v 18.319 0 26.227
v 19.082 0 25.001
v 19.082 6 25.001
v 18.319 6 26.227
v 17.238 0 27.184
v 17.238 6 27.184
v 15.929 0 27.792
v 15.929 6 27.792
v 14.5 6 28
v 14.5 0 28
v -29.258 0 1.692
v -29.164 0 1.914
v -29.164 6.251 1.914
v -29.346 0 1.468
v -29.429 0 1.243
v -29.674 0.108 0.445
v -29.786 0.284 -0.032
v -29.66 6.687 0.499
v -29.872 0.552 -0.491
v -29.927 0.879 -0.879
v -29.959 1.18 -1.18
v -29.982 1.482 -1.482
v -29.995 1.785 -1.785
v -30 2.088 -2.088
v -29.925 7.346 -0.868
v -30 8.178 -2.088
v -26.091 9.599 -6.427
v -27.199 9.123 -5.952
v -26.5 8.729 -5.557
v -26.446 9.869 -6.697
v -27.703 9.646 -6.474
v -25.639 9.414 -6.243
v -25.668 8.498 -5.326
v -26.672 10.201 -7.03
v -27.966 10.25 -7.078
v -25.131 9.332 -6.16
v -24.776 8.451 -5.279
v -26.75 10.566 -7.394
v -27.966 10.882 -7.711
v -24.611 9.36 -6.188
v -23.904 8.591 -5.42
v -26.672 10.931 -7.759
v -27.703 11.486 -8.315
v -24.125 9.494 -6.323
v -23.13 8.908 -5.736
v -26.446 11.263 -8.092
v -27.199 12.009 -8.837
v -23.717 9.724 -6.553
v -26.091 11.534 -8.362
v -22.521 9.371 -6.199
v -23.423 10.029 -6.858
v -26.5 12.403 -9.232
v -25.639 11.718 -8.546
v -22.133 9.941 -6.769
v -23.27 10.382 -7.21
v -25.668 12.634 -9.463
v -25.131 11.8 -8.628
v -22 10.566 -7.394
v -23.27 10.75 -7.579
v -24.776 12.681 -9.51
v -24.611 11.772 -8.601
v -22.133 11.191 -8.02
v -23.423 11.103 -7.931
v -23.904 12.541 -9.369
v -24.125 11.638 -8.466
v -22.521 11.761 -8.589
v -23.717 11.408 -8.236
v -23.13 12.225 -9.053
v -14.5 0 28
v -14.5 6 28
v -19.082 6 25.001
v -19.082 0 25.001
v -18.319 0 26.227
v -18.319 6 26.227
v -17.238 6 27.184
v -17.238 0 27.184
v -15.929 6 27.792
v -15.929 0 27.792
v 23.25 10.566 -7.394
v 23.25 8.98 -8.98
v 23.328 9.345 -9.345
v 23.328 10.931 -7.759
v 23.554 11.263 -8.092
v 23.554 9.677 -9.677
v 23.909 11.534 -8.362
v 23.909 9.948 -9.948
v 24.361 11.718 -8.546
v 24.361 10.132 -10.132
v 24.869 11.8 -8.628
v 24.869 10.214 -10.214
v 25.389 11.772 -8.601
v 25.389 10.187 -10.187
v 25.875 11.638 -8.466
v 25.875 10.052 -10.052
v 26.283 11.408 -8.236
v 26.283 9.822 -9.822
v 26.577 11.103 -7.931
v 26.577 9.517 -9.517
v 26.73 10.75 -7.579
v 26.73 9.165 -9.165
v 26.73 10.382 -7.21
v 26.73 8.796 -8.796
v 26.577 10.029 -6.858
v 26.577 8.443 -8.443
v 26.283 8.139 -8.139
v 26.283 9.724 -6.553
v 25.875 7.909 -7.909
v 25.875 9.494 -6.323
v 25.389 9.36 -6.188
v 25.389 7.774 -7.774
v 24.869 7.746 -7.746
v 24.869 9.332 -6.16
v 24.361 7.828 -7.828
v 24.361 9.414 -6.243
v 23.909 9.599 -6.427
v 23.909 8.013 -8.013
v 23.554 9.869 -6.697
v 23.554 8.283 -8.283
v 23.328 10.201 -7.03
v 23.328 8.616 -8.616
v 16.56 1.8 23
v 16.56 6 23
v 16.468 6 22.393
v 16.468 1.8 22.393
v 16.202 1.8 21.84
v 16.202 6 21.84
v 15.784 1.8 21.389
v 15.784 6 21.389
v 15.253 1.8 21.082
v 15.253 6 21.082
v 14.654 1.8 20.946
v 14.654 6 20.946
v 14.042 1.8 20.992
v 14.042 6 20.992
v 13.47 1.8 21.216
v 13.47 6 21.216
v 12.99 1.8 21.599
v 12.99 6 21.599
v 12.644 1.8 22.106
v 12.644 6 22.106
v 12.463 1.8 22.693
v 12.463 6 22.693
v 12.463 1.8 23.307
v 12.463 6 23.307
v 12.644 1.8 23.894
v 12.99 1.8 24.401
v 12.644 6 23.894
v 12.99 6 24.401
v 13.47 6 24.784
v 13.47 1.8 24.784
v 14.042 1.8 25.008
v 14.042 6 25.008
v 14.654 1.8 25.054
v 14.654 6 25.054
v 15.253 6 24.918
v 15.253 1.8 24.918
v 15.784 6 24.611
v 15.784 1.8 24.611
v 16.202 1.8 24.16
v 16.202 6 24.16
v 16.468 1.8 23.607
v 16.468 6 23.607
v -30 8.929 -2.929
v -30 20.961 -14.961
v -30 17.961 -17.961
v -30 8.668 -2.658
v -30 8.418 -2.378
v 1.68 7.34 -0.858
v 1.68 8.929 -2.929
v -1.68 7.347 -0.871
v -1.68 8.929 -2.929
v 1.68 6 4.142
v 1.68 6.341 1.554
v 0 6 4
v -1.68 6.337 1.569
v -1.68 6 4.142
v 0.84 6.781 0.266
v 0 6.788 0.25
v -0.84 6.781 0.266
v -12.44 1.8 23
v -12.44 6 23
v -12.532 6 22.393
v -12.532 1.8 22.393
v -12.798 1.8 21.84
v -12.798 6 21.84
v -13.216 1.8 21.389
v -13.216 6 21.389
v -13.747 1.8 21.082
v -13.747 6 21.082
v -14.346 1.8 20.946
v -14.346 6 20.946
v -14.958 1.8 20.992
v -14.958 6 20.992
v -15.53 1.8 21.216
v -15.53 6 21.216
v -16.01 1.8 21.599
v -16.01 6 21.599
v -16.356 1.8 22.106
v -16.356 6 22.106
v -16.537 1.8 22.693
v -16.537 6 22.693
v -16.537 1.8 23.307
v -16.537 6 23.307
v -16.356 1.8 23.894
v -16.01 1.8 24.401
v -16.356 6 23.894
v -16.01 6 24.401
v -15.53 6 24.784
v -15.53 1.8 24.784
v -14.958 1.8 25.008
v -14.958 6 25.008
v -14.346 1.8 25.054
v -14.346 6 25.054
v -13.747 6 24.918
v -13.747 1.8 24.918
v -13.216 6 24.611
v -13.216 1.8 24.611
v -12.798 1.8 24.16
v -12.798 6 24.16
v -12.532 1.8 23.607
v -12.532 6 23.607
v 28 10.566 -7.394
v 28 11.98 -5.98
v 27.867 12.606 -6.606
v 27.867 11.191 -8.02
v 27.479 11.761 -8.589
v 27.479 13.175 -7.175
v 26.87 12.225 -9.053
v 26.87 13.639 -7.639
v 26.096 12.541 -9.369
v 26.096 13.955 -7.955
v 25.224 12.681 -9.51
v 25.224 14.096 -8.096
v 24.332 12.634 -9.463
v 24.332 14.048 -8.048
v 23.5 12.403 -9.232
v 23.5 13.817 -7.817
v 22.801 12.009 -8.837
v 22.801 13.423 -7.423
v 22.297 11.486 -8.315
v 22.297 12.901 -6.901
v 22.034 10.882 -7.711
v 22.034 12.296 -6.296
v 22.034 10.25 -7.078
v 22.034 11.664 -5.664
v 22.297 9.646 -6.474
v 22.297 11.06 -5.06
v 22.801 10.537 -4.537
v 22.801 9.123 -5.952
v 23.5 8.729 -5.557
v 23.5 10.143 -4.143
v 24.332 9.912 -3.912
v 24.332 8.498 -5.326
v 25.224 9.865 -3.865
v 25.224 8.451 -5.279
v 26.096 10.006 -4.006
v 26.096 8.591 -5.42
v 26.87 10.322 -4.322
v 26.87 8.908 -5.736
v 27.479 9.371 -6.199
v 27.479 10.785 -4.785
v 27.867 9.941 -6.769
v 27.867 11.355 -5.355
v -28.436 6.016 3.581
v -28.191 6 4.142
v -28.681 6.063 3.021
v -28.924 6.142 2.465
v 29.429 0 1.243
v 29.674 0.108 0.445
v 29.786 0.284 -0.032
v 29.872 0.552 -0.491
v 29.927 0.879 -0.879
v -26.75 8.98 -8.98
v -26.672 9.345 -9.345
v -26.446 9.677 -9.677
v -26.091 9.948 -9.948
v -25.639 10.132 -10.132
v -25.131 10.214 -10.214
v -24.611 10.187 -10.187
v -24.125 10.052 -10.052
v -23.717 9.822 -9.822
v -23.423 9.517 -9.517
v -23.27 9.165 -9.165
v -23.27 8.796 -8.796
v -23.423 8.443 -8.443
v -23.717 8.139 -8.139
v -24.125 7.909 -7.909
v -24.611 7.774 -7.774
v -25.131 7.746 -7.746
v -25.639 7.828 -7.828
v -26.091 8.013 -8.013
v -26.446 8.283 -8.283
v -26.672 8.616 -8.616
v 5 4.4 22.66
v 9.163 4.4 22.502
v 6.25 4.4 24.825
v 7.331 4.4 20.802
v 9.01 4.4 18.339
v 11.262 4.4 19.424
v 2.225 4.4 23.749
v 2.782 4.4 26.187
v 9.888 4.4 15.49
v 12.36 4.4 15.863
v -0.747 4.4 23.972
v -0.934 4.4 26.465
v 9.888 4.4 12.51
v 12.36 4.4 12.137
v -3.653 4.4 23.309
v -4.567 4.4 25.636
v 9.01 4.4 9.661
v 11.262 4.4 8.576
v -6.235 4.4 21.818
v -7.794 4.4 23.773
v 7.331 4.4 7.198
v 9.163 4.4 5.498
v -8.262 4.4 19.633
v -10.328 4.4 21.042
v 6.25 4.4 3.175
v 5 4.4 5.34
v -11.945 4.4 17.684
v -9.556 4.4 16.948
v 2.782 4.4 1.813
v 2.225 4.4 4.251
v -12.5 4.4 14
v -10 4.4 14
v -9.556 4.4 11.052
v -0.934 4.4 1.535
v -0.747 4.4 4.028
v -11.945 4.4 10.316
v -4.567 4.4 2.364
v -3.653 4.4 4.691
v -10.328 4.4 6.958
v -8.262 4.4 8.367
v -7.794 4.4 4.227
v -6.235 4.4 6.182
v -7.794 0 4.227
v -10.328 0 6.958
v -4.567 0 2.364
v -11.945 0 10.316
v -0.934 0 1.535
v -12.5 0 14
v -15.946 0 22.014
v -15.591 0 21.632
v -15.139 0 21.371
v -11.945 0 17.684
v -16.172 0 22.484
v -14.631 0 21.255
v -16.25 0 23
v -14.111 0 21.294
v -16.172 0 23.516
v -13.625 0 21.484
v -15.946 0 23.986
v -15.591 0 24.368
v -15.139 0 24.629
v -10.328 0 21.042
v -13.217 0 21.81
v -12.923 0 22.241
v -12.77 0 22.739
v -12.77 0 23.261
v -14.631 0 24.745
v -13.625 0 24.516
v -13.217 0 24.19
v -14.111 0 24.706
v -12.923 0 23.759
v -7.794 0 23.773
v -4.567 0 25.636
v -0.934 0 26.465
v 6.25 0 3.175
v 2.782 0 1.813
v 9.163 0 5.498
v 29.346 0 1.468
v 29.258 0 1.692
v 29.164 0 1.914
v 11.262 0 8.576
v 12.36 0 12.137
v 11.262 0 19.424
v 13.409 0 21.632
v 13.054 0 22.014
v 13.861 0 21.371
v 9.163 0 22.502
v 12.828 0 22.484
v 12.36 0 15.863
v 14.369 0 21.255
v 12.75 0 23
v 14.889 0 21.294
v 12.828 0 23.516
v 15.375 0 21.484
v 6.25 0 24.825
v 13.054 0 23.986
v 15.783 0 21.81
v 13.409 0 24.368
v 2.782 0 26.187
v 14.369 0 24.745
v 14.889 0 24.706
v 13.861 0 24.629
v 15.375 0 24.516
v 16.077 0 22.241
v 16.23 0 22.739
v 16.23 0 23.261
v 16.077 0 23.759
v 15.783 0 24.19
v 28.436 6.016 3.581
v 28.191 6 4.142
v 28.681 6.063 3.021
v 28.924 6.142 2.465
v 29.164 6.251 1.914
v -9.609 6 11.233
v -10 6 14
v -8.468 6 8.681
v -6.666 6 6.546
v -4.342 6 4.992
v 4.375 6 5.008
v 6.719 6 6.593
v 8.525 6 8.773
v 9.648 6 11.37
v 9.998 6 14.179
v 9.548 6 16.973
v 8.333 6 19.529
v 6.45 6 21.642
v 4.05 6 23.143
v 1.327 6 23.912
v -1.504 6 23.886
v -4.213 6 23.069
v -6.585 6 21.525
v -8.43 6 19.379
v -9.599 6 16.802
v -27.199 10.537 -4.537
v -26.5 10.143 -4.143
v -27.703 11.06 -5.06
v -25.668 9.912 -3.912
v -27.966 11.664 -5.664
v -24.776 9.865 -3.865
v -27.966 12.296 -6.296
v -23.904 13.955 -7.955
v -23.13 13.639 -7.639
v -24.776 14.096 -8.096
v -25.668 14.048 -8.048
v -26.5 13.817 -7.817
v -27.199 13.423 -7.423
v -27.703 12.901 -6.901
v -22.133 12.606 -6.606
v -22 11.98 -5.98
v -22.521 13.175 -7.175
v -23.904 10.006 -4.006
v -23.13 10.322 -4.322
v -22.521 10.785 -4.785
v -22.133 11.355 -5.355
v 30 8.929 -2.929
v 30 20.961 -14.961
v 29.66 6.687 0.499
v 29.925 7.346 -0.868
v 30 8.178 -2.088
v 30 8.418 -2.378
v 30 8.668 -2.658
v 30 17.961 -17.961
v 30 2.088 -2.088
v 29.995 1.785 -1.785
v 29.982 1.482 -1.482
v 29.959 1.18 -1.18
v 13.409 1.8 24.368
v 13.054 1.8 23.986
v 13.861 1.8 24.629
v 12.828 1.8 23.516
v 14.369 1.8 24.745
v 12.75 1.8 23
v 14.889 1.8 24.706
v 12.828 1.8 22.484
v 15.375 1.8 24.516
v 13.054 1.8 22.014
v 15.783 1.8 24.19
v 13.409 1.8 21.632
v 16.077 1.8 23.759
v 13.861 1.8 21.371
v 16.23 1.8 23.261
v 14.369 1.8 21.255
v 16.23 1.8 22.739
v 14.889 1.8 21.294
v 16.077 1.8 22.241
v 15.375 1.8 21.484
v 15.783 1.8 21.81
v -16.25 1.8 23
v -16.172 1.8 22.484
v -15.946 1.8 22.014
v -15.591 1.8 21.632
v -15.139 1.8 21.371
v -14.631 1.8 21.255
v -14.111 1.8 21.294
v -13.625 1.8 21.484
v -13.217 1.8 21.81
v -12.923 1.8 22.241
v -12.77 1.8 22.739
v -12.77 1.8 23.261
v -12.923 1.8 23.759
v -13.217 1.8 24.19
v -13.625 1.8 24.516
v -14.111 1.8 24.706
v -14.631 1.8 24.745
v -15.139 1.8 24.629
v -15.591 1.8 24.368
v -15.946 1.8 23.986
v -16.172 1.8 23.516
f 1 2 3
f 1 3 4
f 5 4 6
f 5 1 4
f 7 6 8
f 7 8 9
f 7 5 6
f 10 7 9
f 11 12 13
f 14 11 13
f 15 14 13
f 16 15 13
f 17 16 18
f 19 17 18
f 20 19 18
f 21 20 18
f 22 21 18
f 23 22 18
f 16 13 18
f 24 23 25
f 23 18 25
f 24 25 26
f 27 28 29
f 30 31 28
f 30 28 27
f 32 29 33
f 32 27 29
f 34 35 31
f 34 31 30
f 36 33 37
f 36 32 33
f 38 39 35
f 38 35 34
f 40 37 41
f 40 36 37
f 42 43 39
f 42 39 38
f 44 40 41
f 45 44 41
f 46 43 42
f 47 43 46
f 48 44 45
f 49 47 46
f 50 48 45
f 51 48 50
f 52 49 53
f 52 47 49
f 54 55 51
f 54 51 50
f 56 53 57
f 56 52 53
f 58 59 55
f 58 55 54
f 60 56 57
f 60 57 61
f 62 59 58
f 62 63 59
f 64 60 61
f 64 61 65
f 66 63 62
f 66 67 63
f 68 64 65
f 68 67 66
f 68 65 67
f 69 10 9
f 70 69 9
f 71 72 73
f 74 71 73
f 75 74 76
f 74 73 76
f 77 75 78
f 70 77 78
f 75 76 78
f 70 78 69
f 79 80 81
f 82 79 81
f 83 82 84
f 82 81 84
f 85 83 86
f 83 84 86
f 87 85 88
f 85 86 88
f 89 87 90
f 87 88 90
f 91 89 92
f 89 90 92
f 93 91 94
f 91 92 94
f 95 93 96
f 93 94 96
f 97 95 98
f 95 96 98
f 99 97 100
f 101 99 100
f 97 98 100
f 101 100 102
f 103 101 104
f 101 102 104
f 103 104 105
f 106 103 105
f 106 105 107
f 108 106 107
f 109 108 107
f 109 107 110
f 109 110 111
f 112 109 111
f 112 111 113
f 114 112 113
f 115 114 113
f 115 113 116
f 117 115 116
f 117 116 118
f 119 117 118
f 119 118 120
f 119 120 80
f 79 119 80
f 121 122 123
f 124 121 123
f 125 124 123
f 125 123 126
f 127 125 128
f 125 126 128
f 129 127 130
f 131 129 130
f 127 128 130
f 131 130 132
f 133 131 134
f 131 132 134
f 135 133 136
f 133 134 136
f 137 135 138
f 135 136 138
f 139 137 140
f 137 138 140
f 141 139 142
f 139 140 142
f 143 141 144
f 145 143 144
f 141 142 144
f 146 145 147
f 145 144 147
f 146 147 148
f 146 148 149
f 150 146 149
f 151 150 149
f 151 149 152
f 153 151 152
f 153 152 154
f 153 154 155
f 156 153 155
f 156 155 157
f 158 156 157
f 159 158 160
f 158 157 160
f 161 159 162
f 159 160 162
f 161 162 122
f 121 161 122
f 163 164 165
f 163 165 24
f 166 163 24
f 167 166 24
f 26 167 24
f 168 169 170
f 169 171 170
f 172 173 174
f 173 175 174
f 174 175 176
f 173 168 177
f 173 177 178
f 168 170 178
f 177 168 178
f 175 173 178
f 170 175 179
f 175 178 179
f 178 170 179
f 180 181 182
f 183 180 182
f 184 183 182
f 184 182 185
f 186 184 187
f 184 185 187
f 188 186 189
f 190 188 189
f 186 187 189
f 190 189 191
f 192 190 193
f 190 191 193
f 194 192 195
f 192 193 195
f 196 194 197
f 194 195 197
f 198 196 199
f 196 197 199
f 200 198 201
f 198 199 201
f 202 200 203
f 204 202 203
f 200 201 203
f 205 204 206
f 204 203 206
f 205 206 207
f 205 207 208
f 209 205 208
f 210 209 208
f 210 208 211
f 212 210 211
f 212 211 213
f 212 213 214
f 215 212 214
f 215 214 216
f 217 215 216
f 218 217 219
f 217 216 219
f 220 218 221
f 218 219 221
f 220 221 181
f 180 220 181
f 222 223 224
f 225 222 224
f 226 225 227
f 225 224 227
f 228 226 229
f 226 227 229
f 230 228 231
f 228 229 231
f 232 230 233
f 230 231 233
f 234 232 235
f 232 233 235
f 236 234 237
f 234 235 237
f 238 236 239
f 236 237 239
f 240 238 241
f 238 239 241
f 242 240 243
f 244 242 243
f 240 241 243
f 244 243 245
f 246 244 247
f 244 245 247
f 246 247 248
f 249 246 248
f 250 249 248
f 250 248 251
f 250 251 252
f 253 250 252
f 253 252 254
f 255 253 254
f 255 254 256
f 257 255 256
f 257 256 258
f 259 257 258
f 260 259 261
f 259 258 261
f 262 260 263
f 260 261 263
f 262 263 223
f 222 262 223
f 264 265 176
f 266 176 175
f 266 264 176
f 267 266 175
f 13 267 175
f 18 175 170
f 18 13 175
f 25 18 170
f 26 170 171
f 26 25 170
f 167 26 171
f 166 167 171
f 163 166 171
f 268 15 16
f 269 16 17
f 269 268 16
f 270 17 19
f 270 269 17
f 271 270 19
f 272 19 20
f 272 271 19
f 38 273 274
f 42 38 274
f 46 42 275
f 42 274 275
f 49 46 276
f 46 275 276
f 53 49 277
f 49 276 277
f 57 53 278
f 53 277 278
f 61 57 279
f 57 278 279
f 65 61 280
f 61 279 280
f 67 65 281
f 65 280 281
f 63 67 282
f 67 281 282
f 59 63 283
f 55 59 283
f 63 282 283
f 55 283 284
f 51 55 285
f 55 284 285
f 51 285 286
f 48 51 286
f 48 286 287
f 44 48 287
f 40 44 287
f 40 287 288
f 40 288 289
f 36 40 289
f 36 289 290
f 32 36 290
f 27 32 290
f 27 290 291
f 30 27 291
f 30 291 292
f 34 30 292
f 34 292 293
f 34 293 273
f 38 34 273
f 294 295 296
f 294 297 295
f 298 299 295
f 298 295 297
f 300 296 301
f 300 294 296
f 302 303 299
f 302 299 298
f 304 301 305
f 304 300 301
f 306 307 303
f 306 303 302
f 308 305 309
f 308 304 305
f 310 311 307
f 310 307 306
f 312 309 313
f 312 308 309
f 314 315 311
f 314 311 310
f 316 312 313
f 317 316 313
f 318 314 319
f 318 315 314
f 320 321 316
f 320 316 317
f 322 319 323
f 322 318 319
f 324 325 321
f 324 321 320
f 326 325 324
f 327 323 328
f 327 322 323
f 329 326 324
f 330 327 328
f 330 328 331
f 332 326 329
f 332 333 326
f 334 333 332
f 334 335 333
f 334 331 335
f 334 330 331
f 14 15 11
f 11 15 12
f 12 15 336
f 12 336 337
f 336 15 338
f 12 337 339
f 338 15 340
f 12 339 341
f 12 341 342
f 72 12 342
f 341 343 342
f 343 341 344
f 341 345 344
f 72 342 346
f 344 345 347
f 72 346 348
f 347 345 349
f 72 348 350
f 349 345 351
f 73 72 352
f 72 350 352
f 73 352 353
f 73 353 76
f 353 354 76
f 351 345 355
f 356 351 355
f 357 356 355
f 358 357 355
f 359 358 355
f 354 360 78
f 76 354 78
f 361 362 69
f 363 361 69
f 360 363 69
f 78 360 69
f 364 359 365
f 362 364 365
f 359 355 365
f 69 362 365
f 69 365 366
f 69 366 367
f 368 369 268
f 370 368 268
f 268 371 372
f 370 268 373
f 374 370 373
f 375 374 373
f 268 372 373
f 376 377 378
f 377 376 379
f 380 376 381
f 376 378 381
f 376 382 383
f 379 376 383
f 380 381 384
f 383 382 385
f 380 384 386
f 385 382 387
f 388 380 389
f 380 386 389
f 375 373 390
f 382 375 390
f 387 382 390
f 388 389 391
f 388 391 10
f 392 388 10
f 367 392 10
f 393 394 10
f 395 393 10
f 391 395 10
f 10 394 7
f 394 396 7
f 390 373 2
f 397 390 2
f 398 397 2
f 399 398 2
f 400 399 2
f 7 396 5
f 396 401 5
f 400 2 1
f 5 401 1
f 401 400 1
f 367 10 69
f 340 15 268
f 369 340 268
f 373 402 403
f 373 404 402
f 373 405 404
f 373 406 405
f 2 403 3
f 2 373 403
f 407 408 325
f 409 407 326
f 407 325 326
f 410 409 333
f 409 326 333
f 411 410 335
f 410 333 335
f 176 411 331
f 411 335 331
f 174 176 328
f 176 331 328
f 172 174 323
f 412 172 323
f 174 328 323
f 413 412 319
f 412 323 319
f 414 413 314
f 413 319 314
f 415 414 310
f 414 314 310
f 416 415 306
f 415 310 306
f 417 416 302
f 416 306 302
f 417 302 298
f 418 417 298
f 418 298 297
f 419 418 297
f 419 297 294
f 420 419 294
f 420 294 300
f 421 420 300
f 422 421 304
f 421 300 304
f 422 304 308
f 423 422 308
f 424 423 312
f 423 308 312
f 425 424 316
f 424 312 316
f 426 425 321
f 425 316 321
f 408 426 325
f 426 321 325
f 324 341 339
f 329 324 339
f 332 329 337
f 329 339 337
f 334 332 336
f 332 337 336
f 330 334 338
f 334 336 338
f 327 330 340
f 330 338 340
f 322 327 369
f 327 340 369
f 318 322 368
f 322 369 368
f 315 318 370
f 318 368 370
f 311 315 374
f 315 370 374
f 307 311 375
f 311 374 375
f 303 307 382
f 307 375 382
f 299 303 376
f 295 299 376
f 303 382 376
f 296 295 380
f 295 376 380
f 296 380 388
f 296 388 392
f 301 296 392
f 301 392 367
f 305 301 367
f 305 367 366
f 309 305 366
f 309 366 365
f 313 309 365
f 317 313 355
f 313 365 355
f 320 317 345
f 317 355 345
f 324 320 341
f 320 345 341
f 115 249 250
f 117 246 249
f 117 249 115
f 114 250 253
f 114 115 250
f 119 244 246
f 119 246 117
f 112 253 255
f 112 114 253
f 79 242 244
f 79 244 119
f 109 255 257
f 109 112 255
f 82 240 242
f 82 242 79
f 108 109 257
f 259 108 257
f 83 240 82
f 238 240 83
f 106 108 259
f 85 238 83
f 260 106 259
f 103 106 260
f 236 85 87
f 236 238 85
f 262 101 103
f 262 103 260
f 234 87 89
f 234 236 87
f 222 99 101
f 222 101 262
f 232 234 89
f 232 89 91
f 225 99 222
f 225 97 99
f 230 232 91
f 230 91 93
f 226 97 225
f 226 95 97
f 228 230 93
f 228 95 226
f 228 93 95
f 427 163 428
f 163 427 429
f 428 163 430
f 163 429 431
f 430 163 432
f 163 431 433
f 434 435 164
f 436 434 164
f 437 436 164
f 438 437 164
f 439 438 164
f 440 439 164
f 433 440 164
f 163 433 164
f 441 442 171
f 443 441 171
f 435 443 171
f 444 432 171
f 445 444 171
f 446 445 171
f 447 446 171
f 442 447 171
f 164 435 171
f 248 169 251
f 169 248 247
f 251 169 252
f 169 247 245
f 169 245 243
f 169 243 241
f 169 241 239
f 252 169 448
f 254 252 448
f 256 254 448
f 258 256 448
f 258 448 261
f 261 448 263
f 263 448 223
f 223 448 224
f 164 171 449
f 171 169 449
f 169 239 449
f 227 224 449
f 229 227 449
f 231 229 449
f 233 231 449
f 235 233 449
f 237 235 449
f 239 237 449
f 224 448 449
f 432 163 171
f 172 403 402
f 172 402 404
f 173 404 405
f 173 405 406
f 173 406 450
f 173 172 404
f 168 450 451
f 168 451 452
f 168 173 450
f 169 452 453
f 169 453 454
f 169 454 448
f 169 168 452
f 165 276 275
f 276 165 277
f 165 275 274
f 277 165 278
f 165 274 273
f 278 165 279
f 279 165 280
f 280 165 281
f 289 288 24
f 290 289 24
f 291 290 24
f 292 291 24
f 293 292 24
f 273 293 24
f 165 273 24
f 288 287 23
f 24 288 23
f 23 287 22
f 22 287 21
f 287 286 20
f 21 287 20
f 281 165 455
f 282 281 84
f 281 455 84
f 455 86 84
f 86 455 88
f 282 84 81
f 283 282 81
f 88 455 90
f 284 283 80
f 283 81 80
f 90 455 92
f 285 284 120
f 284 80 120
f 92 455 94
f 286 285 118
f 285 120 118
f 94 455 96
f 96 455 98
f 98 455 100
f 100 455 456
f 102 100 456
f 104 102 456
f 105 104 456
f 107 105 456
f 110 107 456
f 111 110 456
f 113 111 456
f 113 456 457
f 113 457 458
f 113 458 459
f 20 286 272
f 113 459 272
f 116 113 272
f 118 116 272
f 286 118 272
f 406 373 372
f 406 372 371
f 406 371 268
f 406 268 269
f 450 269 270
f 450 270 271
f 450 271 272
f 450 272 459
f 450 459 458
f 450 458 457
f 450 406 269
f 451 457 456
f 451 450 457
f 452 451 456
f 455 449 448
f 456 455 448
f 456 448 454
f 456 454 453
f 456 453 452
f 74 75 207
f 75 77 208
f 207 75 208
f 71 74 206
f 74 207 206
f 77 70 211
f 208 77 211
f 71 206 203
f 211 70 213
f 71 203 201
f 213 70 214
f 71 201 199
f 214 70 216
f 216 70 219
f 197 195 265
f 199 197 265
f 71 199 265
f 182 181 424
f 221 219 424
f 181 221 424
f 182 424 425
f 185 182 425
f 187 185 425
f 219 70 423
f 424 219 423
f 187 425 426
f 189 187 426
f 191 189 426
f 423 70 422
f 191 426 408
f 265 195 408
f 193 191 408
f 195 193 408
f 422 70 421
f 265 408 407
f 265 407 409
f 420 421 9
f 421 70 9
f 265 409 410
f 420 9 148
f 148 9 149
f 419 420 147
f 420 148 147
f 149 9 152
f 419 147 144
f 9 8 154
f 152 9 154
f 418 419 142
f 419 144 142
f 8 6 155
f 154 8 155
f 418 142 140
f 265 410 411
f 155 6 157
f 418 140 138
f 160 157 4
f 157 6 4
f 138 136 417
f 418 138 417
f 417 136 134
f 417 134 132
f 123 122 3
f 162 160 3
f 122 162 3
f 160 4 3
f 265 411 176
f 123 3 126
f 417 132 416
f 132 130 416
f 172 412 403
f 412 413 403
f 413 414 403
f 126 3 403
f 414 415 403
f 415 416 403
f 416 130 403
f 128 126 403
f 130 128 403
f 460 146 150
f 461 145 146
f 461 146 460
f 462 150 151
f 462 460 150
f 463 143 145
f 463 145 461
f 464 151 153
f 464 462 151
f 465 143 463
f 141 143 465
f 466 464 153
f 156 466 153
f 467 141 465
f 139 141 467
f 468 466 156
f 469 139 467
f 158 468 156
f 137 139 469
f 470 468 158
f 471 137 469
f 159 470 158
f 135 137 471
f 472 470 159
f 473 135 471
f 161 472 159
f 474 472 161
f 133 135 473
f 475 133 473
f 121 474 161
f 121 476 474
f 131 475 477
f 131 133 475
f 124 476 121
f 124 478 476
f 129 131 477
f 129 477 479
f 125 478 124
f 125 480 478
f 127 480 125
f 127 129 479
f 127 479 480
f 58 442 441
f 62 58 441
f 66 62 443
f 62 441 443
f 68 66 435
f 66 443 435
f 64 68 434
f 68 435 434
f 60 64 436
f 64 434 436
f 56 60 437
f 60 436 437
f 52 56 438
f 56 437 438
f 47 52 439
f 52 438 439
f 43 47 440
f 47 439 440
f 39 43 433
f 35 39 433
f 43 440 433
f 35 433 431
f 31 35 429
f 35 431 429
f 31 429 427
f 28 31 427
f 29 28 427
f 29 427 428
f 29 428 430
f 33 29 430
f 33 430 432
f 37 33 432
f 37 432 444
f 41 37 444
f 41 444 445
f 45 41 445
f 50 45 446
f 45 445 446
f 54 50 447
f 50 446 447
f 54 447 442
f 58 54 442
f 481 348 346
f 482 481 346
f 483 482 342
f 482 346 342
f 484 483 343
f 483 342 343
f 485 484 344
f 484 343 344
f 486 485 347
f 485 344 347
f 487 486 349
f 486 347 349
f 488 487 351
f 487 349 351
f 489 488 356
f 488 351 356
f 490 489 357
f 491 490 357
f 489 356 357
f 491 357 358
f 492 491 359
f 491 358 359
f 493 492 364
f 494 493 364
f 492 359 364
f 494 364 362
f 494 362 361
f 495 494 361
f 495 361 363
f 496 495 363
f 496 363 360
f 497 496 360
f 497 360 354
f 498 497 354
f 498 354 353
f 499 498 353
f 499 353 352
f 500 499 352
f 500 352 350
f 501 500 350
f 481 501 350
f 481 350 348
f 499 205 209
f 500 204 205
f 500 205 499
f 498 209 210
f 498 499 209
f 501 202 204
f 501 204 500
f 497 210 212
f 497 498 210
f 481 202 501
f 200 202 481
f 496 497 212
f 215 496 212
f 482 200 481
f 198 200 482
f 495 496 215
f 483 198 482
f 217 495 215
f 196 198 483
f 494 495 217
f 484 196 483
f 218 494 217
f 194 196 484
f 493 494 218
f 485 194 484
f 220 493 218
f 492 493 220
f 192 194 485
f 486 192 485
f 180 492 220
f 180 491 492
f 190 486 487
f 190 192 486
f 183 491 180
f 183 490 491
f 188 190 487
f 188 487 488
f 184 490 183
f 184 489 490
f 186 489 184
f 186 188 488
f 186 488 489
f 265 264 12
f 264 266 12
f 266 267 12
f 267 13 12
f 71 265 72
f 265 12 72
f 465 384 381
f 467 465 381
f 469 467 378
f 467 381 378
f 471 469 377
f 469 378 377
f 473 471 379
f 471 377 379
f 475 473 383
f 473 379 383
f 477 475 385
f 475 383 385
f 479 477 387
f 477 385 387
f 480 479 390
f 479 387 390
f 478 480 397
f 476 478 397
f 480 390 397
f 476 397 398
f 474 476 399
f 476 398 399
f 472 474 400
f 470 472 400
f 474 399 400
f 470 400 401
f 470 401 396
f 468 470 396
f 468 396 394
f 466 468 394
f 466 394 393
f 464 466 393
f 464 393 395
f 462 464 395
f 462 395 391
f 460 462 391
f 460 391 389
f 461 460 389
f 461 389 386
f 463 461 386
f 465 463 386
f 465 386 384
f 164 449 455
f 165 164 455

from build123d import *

# Parameters (mm, degrees)
SALIENTE_EXTRUIR1_DEPTH      = 30
SALIENTE_EXTRUIR1_DEPTH_BACK = 30
CROQUIS3_R                   = 1.75
CORTAR_EXTRUIR1_DEPTH        = 4.242641
CROQUIS4_R                   = 3
CORTAR_EXTRUIR2_DEPTH        = 2
CROQUIS5_R                   = 10
CROQUIS5_R_2                 = 1.75
CORTAR_EXTRUIR3_DEPTH        = 6
CROQUIS5_4_R                 = 12.5
CROQUIS5_4_R_2               = 10
CORTAR_EXTRUIR4_DEPTH        = 4.4
REDONDEO1_R                  = 10
REDONDEO2_R                  = 3
REDONDEO3_R                  = 10
CROQUIS6_R                   = 2.06
CORTAR_EXTRUIR5_DEPTH        = 4.2


with BuildPart() as part:
    # Croquis2 → Saliente-Extruir1 (new body, two sides)
    with BuildSketch(Plane(origin=(0, 0, 0), x_dir=(0, 0, -1), z_dir=(1, 0, 0))) as saliente_extruir1_sk:
        Polygon((0, 0), (-28, 0), (-28, 6), (0, 6), (14.960512242, 20.960512242), (17.960512242, 17.960512242), align=None)
    extrude(amount=SALIENTE_EXTRUIR1_DEPTH)
    extrude(saliente_extruir1_sk.sketch, amount=-SALIENTE_EXTRUIR1_DEPTH_BACK)

    # Croquis3 → Cortar-Extruir1 (cut)
    with BuildSketch(Plane(origin=(0, 0, 0), x_dir=(-1, 0, 0), z_dir=(0, -0.707106781, -0.707106781))):
        with Locations((-25, 12.7)):
            Circle(CROQUIS3_R)
        with Locations((25, 12.7)):
            Circle(CROQUIS3_R)
    extrude(amount=-CORTAR_EXTRUIR1_DEPTH, mode=Mode.SUBTRACT)

    # Croquis4 → Cortar-Extruir2 (cut)
    with BuildSketch(Plane(origin=(0, 3, 3), x_dir=(1, 0, 0), z_dir=(0, 0.707106781, 0.707106781))):
        with Locations((-25, 12.7)):
            Circle(CROQUIS4_R)
        with Locations((25, 12.7)):
            Circle(CROQUIS4_R)
    extrude(amount=-CORTAR_EXTRUIR2_DEPTH, mode=Mode.SUBTRACT)

    # Croquis5 → Cortar-Extruir3 (cut)
    with BuildSketch(Plane(origin=(0, 0, 0), x_dir=(-1, 0, 0), z_dir=(0, -1, 0))):
        with Locations((0, -14)):
            Circle(CROQUIS5_R)
        with Locations((14.5, -23)):
            Circle(CROQUIS5_R_2)
        with Locations((-14.5, -23)):
            Circle(CROQUIS5_R_2)
        with BuildLine():
            ThreePointArc((-19.082136833, -25.001005257), (-17.238153914, -27.1836005), (-14.5, -28))
            Line((-14.5, -28), (-30, -28))
            Line((-30, -28), (-30, 0))
            Line((-30, 0), (-19.082136833, -25.001005257))
        make_face()
        with BuildLine():
            Line((30, 0), (19.082136833, -25.001005257))
            ThreePointArc((19.082136833, -25.001005257), (17.238153914, -27.1836005), (14.5, -28))
            Line((14.5, -28), (30, -28))
            Line((30, -28), (30, 0))
        make_face()
    extrude(amount=-CORTAR_EXTRUIR3_DEPTH, mode=Mode.SUBTRACT)

    # Croquis5<4> → Cortar-Extruir4 (cut)
    with BuildSketch(Plane(origin=(0, 0, 0), x_dir=(-1, 0, 0), z_dir=(0, -1, 0))):
        with Locations((0, -14)):
            Circle(CROQUIS5_4_R)
        with Locations((0, -14)):
            Circle(CROQUIS5_4_R_2, mode=Mode.SUBTRACT)
    extrude(amount=-CORTAR_EXTRUIR4_DEPTH, mode=Mode.SUBTRACT)

    # Redondeo1
    redondeo1_edges = [part.edges().sort_by_distance(p)[0] for p in [
        (0, 6, 0),
    ]]
    fillet(redondeo1_edges, radius=REDONDEO1_R)

    # Redondeo2
    redondeo2_edges = [part.edges().sort_by_distance(p)[0] for p in [
        (0, 0, 0),
    ]]
    fillet(redondeo2_edges, radius=REDONDEO2_R)

    # Redondeo3
    redondeo3_edges = [part.edges().sort_by_distance(p)[0] for p in [
        (-30, 3.583831813, 0),
        (30, 3.583831813, 0),
    ]]
    fillet(redondeo3_edges, radius=REDONDEO3_R)

    # Croquis6 → Cortar-Extruir5 (cut)
    with BuildSketch(Plane(origin=(0, 6, 0), x_dir=(1, 0, 0), z_dir=(0, 1, 0))):
        with Locations((-14.5, -23)):
            Circle(CROQUIS6_R)
        with Locations((14.5, -23)):
            Circle(CROQUIS6_R)
    extrude(amount=-CORTAR_EXTRUIR5_DEPTH, mode=Mode.SUBTRACT)


solid = part.part
